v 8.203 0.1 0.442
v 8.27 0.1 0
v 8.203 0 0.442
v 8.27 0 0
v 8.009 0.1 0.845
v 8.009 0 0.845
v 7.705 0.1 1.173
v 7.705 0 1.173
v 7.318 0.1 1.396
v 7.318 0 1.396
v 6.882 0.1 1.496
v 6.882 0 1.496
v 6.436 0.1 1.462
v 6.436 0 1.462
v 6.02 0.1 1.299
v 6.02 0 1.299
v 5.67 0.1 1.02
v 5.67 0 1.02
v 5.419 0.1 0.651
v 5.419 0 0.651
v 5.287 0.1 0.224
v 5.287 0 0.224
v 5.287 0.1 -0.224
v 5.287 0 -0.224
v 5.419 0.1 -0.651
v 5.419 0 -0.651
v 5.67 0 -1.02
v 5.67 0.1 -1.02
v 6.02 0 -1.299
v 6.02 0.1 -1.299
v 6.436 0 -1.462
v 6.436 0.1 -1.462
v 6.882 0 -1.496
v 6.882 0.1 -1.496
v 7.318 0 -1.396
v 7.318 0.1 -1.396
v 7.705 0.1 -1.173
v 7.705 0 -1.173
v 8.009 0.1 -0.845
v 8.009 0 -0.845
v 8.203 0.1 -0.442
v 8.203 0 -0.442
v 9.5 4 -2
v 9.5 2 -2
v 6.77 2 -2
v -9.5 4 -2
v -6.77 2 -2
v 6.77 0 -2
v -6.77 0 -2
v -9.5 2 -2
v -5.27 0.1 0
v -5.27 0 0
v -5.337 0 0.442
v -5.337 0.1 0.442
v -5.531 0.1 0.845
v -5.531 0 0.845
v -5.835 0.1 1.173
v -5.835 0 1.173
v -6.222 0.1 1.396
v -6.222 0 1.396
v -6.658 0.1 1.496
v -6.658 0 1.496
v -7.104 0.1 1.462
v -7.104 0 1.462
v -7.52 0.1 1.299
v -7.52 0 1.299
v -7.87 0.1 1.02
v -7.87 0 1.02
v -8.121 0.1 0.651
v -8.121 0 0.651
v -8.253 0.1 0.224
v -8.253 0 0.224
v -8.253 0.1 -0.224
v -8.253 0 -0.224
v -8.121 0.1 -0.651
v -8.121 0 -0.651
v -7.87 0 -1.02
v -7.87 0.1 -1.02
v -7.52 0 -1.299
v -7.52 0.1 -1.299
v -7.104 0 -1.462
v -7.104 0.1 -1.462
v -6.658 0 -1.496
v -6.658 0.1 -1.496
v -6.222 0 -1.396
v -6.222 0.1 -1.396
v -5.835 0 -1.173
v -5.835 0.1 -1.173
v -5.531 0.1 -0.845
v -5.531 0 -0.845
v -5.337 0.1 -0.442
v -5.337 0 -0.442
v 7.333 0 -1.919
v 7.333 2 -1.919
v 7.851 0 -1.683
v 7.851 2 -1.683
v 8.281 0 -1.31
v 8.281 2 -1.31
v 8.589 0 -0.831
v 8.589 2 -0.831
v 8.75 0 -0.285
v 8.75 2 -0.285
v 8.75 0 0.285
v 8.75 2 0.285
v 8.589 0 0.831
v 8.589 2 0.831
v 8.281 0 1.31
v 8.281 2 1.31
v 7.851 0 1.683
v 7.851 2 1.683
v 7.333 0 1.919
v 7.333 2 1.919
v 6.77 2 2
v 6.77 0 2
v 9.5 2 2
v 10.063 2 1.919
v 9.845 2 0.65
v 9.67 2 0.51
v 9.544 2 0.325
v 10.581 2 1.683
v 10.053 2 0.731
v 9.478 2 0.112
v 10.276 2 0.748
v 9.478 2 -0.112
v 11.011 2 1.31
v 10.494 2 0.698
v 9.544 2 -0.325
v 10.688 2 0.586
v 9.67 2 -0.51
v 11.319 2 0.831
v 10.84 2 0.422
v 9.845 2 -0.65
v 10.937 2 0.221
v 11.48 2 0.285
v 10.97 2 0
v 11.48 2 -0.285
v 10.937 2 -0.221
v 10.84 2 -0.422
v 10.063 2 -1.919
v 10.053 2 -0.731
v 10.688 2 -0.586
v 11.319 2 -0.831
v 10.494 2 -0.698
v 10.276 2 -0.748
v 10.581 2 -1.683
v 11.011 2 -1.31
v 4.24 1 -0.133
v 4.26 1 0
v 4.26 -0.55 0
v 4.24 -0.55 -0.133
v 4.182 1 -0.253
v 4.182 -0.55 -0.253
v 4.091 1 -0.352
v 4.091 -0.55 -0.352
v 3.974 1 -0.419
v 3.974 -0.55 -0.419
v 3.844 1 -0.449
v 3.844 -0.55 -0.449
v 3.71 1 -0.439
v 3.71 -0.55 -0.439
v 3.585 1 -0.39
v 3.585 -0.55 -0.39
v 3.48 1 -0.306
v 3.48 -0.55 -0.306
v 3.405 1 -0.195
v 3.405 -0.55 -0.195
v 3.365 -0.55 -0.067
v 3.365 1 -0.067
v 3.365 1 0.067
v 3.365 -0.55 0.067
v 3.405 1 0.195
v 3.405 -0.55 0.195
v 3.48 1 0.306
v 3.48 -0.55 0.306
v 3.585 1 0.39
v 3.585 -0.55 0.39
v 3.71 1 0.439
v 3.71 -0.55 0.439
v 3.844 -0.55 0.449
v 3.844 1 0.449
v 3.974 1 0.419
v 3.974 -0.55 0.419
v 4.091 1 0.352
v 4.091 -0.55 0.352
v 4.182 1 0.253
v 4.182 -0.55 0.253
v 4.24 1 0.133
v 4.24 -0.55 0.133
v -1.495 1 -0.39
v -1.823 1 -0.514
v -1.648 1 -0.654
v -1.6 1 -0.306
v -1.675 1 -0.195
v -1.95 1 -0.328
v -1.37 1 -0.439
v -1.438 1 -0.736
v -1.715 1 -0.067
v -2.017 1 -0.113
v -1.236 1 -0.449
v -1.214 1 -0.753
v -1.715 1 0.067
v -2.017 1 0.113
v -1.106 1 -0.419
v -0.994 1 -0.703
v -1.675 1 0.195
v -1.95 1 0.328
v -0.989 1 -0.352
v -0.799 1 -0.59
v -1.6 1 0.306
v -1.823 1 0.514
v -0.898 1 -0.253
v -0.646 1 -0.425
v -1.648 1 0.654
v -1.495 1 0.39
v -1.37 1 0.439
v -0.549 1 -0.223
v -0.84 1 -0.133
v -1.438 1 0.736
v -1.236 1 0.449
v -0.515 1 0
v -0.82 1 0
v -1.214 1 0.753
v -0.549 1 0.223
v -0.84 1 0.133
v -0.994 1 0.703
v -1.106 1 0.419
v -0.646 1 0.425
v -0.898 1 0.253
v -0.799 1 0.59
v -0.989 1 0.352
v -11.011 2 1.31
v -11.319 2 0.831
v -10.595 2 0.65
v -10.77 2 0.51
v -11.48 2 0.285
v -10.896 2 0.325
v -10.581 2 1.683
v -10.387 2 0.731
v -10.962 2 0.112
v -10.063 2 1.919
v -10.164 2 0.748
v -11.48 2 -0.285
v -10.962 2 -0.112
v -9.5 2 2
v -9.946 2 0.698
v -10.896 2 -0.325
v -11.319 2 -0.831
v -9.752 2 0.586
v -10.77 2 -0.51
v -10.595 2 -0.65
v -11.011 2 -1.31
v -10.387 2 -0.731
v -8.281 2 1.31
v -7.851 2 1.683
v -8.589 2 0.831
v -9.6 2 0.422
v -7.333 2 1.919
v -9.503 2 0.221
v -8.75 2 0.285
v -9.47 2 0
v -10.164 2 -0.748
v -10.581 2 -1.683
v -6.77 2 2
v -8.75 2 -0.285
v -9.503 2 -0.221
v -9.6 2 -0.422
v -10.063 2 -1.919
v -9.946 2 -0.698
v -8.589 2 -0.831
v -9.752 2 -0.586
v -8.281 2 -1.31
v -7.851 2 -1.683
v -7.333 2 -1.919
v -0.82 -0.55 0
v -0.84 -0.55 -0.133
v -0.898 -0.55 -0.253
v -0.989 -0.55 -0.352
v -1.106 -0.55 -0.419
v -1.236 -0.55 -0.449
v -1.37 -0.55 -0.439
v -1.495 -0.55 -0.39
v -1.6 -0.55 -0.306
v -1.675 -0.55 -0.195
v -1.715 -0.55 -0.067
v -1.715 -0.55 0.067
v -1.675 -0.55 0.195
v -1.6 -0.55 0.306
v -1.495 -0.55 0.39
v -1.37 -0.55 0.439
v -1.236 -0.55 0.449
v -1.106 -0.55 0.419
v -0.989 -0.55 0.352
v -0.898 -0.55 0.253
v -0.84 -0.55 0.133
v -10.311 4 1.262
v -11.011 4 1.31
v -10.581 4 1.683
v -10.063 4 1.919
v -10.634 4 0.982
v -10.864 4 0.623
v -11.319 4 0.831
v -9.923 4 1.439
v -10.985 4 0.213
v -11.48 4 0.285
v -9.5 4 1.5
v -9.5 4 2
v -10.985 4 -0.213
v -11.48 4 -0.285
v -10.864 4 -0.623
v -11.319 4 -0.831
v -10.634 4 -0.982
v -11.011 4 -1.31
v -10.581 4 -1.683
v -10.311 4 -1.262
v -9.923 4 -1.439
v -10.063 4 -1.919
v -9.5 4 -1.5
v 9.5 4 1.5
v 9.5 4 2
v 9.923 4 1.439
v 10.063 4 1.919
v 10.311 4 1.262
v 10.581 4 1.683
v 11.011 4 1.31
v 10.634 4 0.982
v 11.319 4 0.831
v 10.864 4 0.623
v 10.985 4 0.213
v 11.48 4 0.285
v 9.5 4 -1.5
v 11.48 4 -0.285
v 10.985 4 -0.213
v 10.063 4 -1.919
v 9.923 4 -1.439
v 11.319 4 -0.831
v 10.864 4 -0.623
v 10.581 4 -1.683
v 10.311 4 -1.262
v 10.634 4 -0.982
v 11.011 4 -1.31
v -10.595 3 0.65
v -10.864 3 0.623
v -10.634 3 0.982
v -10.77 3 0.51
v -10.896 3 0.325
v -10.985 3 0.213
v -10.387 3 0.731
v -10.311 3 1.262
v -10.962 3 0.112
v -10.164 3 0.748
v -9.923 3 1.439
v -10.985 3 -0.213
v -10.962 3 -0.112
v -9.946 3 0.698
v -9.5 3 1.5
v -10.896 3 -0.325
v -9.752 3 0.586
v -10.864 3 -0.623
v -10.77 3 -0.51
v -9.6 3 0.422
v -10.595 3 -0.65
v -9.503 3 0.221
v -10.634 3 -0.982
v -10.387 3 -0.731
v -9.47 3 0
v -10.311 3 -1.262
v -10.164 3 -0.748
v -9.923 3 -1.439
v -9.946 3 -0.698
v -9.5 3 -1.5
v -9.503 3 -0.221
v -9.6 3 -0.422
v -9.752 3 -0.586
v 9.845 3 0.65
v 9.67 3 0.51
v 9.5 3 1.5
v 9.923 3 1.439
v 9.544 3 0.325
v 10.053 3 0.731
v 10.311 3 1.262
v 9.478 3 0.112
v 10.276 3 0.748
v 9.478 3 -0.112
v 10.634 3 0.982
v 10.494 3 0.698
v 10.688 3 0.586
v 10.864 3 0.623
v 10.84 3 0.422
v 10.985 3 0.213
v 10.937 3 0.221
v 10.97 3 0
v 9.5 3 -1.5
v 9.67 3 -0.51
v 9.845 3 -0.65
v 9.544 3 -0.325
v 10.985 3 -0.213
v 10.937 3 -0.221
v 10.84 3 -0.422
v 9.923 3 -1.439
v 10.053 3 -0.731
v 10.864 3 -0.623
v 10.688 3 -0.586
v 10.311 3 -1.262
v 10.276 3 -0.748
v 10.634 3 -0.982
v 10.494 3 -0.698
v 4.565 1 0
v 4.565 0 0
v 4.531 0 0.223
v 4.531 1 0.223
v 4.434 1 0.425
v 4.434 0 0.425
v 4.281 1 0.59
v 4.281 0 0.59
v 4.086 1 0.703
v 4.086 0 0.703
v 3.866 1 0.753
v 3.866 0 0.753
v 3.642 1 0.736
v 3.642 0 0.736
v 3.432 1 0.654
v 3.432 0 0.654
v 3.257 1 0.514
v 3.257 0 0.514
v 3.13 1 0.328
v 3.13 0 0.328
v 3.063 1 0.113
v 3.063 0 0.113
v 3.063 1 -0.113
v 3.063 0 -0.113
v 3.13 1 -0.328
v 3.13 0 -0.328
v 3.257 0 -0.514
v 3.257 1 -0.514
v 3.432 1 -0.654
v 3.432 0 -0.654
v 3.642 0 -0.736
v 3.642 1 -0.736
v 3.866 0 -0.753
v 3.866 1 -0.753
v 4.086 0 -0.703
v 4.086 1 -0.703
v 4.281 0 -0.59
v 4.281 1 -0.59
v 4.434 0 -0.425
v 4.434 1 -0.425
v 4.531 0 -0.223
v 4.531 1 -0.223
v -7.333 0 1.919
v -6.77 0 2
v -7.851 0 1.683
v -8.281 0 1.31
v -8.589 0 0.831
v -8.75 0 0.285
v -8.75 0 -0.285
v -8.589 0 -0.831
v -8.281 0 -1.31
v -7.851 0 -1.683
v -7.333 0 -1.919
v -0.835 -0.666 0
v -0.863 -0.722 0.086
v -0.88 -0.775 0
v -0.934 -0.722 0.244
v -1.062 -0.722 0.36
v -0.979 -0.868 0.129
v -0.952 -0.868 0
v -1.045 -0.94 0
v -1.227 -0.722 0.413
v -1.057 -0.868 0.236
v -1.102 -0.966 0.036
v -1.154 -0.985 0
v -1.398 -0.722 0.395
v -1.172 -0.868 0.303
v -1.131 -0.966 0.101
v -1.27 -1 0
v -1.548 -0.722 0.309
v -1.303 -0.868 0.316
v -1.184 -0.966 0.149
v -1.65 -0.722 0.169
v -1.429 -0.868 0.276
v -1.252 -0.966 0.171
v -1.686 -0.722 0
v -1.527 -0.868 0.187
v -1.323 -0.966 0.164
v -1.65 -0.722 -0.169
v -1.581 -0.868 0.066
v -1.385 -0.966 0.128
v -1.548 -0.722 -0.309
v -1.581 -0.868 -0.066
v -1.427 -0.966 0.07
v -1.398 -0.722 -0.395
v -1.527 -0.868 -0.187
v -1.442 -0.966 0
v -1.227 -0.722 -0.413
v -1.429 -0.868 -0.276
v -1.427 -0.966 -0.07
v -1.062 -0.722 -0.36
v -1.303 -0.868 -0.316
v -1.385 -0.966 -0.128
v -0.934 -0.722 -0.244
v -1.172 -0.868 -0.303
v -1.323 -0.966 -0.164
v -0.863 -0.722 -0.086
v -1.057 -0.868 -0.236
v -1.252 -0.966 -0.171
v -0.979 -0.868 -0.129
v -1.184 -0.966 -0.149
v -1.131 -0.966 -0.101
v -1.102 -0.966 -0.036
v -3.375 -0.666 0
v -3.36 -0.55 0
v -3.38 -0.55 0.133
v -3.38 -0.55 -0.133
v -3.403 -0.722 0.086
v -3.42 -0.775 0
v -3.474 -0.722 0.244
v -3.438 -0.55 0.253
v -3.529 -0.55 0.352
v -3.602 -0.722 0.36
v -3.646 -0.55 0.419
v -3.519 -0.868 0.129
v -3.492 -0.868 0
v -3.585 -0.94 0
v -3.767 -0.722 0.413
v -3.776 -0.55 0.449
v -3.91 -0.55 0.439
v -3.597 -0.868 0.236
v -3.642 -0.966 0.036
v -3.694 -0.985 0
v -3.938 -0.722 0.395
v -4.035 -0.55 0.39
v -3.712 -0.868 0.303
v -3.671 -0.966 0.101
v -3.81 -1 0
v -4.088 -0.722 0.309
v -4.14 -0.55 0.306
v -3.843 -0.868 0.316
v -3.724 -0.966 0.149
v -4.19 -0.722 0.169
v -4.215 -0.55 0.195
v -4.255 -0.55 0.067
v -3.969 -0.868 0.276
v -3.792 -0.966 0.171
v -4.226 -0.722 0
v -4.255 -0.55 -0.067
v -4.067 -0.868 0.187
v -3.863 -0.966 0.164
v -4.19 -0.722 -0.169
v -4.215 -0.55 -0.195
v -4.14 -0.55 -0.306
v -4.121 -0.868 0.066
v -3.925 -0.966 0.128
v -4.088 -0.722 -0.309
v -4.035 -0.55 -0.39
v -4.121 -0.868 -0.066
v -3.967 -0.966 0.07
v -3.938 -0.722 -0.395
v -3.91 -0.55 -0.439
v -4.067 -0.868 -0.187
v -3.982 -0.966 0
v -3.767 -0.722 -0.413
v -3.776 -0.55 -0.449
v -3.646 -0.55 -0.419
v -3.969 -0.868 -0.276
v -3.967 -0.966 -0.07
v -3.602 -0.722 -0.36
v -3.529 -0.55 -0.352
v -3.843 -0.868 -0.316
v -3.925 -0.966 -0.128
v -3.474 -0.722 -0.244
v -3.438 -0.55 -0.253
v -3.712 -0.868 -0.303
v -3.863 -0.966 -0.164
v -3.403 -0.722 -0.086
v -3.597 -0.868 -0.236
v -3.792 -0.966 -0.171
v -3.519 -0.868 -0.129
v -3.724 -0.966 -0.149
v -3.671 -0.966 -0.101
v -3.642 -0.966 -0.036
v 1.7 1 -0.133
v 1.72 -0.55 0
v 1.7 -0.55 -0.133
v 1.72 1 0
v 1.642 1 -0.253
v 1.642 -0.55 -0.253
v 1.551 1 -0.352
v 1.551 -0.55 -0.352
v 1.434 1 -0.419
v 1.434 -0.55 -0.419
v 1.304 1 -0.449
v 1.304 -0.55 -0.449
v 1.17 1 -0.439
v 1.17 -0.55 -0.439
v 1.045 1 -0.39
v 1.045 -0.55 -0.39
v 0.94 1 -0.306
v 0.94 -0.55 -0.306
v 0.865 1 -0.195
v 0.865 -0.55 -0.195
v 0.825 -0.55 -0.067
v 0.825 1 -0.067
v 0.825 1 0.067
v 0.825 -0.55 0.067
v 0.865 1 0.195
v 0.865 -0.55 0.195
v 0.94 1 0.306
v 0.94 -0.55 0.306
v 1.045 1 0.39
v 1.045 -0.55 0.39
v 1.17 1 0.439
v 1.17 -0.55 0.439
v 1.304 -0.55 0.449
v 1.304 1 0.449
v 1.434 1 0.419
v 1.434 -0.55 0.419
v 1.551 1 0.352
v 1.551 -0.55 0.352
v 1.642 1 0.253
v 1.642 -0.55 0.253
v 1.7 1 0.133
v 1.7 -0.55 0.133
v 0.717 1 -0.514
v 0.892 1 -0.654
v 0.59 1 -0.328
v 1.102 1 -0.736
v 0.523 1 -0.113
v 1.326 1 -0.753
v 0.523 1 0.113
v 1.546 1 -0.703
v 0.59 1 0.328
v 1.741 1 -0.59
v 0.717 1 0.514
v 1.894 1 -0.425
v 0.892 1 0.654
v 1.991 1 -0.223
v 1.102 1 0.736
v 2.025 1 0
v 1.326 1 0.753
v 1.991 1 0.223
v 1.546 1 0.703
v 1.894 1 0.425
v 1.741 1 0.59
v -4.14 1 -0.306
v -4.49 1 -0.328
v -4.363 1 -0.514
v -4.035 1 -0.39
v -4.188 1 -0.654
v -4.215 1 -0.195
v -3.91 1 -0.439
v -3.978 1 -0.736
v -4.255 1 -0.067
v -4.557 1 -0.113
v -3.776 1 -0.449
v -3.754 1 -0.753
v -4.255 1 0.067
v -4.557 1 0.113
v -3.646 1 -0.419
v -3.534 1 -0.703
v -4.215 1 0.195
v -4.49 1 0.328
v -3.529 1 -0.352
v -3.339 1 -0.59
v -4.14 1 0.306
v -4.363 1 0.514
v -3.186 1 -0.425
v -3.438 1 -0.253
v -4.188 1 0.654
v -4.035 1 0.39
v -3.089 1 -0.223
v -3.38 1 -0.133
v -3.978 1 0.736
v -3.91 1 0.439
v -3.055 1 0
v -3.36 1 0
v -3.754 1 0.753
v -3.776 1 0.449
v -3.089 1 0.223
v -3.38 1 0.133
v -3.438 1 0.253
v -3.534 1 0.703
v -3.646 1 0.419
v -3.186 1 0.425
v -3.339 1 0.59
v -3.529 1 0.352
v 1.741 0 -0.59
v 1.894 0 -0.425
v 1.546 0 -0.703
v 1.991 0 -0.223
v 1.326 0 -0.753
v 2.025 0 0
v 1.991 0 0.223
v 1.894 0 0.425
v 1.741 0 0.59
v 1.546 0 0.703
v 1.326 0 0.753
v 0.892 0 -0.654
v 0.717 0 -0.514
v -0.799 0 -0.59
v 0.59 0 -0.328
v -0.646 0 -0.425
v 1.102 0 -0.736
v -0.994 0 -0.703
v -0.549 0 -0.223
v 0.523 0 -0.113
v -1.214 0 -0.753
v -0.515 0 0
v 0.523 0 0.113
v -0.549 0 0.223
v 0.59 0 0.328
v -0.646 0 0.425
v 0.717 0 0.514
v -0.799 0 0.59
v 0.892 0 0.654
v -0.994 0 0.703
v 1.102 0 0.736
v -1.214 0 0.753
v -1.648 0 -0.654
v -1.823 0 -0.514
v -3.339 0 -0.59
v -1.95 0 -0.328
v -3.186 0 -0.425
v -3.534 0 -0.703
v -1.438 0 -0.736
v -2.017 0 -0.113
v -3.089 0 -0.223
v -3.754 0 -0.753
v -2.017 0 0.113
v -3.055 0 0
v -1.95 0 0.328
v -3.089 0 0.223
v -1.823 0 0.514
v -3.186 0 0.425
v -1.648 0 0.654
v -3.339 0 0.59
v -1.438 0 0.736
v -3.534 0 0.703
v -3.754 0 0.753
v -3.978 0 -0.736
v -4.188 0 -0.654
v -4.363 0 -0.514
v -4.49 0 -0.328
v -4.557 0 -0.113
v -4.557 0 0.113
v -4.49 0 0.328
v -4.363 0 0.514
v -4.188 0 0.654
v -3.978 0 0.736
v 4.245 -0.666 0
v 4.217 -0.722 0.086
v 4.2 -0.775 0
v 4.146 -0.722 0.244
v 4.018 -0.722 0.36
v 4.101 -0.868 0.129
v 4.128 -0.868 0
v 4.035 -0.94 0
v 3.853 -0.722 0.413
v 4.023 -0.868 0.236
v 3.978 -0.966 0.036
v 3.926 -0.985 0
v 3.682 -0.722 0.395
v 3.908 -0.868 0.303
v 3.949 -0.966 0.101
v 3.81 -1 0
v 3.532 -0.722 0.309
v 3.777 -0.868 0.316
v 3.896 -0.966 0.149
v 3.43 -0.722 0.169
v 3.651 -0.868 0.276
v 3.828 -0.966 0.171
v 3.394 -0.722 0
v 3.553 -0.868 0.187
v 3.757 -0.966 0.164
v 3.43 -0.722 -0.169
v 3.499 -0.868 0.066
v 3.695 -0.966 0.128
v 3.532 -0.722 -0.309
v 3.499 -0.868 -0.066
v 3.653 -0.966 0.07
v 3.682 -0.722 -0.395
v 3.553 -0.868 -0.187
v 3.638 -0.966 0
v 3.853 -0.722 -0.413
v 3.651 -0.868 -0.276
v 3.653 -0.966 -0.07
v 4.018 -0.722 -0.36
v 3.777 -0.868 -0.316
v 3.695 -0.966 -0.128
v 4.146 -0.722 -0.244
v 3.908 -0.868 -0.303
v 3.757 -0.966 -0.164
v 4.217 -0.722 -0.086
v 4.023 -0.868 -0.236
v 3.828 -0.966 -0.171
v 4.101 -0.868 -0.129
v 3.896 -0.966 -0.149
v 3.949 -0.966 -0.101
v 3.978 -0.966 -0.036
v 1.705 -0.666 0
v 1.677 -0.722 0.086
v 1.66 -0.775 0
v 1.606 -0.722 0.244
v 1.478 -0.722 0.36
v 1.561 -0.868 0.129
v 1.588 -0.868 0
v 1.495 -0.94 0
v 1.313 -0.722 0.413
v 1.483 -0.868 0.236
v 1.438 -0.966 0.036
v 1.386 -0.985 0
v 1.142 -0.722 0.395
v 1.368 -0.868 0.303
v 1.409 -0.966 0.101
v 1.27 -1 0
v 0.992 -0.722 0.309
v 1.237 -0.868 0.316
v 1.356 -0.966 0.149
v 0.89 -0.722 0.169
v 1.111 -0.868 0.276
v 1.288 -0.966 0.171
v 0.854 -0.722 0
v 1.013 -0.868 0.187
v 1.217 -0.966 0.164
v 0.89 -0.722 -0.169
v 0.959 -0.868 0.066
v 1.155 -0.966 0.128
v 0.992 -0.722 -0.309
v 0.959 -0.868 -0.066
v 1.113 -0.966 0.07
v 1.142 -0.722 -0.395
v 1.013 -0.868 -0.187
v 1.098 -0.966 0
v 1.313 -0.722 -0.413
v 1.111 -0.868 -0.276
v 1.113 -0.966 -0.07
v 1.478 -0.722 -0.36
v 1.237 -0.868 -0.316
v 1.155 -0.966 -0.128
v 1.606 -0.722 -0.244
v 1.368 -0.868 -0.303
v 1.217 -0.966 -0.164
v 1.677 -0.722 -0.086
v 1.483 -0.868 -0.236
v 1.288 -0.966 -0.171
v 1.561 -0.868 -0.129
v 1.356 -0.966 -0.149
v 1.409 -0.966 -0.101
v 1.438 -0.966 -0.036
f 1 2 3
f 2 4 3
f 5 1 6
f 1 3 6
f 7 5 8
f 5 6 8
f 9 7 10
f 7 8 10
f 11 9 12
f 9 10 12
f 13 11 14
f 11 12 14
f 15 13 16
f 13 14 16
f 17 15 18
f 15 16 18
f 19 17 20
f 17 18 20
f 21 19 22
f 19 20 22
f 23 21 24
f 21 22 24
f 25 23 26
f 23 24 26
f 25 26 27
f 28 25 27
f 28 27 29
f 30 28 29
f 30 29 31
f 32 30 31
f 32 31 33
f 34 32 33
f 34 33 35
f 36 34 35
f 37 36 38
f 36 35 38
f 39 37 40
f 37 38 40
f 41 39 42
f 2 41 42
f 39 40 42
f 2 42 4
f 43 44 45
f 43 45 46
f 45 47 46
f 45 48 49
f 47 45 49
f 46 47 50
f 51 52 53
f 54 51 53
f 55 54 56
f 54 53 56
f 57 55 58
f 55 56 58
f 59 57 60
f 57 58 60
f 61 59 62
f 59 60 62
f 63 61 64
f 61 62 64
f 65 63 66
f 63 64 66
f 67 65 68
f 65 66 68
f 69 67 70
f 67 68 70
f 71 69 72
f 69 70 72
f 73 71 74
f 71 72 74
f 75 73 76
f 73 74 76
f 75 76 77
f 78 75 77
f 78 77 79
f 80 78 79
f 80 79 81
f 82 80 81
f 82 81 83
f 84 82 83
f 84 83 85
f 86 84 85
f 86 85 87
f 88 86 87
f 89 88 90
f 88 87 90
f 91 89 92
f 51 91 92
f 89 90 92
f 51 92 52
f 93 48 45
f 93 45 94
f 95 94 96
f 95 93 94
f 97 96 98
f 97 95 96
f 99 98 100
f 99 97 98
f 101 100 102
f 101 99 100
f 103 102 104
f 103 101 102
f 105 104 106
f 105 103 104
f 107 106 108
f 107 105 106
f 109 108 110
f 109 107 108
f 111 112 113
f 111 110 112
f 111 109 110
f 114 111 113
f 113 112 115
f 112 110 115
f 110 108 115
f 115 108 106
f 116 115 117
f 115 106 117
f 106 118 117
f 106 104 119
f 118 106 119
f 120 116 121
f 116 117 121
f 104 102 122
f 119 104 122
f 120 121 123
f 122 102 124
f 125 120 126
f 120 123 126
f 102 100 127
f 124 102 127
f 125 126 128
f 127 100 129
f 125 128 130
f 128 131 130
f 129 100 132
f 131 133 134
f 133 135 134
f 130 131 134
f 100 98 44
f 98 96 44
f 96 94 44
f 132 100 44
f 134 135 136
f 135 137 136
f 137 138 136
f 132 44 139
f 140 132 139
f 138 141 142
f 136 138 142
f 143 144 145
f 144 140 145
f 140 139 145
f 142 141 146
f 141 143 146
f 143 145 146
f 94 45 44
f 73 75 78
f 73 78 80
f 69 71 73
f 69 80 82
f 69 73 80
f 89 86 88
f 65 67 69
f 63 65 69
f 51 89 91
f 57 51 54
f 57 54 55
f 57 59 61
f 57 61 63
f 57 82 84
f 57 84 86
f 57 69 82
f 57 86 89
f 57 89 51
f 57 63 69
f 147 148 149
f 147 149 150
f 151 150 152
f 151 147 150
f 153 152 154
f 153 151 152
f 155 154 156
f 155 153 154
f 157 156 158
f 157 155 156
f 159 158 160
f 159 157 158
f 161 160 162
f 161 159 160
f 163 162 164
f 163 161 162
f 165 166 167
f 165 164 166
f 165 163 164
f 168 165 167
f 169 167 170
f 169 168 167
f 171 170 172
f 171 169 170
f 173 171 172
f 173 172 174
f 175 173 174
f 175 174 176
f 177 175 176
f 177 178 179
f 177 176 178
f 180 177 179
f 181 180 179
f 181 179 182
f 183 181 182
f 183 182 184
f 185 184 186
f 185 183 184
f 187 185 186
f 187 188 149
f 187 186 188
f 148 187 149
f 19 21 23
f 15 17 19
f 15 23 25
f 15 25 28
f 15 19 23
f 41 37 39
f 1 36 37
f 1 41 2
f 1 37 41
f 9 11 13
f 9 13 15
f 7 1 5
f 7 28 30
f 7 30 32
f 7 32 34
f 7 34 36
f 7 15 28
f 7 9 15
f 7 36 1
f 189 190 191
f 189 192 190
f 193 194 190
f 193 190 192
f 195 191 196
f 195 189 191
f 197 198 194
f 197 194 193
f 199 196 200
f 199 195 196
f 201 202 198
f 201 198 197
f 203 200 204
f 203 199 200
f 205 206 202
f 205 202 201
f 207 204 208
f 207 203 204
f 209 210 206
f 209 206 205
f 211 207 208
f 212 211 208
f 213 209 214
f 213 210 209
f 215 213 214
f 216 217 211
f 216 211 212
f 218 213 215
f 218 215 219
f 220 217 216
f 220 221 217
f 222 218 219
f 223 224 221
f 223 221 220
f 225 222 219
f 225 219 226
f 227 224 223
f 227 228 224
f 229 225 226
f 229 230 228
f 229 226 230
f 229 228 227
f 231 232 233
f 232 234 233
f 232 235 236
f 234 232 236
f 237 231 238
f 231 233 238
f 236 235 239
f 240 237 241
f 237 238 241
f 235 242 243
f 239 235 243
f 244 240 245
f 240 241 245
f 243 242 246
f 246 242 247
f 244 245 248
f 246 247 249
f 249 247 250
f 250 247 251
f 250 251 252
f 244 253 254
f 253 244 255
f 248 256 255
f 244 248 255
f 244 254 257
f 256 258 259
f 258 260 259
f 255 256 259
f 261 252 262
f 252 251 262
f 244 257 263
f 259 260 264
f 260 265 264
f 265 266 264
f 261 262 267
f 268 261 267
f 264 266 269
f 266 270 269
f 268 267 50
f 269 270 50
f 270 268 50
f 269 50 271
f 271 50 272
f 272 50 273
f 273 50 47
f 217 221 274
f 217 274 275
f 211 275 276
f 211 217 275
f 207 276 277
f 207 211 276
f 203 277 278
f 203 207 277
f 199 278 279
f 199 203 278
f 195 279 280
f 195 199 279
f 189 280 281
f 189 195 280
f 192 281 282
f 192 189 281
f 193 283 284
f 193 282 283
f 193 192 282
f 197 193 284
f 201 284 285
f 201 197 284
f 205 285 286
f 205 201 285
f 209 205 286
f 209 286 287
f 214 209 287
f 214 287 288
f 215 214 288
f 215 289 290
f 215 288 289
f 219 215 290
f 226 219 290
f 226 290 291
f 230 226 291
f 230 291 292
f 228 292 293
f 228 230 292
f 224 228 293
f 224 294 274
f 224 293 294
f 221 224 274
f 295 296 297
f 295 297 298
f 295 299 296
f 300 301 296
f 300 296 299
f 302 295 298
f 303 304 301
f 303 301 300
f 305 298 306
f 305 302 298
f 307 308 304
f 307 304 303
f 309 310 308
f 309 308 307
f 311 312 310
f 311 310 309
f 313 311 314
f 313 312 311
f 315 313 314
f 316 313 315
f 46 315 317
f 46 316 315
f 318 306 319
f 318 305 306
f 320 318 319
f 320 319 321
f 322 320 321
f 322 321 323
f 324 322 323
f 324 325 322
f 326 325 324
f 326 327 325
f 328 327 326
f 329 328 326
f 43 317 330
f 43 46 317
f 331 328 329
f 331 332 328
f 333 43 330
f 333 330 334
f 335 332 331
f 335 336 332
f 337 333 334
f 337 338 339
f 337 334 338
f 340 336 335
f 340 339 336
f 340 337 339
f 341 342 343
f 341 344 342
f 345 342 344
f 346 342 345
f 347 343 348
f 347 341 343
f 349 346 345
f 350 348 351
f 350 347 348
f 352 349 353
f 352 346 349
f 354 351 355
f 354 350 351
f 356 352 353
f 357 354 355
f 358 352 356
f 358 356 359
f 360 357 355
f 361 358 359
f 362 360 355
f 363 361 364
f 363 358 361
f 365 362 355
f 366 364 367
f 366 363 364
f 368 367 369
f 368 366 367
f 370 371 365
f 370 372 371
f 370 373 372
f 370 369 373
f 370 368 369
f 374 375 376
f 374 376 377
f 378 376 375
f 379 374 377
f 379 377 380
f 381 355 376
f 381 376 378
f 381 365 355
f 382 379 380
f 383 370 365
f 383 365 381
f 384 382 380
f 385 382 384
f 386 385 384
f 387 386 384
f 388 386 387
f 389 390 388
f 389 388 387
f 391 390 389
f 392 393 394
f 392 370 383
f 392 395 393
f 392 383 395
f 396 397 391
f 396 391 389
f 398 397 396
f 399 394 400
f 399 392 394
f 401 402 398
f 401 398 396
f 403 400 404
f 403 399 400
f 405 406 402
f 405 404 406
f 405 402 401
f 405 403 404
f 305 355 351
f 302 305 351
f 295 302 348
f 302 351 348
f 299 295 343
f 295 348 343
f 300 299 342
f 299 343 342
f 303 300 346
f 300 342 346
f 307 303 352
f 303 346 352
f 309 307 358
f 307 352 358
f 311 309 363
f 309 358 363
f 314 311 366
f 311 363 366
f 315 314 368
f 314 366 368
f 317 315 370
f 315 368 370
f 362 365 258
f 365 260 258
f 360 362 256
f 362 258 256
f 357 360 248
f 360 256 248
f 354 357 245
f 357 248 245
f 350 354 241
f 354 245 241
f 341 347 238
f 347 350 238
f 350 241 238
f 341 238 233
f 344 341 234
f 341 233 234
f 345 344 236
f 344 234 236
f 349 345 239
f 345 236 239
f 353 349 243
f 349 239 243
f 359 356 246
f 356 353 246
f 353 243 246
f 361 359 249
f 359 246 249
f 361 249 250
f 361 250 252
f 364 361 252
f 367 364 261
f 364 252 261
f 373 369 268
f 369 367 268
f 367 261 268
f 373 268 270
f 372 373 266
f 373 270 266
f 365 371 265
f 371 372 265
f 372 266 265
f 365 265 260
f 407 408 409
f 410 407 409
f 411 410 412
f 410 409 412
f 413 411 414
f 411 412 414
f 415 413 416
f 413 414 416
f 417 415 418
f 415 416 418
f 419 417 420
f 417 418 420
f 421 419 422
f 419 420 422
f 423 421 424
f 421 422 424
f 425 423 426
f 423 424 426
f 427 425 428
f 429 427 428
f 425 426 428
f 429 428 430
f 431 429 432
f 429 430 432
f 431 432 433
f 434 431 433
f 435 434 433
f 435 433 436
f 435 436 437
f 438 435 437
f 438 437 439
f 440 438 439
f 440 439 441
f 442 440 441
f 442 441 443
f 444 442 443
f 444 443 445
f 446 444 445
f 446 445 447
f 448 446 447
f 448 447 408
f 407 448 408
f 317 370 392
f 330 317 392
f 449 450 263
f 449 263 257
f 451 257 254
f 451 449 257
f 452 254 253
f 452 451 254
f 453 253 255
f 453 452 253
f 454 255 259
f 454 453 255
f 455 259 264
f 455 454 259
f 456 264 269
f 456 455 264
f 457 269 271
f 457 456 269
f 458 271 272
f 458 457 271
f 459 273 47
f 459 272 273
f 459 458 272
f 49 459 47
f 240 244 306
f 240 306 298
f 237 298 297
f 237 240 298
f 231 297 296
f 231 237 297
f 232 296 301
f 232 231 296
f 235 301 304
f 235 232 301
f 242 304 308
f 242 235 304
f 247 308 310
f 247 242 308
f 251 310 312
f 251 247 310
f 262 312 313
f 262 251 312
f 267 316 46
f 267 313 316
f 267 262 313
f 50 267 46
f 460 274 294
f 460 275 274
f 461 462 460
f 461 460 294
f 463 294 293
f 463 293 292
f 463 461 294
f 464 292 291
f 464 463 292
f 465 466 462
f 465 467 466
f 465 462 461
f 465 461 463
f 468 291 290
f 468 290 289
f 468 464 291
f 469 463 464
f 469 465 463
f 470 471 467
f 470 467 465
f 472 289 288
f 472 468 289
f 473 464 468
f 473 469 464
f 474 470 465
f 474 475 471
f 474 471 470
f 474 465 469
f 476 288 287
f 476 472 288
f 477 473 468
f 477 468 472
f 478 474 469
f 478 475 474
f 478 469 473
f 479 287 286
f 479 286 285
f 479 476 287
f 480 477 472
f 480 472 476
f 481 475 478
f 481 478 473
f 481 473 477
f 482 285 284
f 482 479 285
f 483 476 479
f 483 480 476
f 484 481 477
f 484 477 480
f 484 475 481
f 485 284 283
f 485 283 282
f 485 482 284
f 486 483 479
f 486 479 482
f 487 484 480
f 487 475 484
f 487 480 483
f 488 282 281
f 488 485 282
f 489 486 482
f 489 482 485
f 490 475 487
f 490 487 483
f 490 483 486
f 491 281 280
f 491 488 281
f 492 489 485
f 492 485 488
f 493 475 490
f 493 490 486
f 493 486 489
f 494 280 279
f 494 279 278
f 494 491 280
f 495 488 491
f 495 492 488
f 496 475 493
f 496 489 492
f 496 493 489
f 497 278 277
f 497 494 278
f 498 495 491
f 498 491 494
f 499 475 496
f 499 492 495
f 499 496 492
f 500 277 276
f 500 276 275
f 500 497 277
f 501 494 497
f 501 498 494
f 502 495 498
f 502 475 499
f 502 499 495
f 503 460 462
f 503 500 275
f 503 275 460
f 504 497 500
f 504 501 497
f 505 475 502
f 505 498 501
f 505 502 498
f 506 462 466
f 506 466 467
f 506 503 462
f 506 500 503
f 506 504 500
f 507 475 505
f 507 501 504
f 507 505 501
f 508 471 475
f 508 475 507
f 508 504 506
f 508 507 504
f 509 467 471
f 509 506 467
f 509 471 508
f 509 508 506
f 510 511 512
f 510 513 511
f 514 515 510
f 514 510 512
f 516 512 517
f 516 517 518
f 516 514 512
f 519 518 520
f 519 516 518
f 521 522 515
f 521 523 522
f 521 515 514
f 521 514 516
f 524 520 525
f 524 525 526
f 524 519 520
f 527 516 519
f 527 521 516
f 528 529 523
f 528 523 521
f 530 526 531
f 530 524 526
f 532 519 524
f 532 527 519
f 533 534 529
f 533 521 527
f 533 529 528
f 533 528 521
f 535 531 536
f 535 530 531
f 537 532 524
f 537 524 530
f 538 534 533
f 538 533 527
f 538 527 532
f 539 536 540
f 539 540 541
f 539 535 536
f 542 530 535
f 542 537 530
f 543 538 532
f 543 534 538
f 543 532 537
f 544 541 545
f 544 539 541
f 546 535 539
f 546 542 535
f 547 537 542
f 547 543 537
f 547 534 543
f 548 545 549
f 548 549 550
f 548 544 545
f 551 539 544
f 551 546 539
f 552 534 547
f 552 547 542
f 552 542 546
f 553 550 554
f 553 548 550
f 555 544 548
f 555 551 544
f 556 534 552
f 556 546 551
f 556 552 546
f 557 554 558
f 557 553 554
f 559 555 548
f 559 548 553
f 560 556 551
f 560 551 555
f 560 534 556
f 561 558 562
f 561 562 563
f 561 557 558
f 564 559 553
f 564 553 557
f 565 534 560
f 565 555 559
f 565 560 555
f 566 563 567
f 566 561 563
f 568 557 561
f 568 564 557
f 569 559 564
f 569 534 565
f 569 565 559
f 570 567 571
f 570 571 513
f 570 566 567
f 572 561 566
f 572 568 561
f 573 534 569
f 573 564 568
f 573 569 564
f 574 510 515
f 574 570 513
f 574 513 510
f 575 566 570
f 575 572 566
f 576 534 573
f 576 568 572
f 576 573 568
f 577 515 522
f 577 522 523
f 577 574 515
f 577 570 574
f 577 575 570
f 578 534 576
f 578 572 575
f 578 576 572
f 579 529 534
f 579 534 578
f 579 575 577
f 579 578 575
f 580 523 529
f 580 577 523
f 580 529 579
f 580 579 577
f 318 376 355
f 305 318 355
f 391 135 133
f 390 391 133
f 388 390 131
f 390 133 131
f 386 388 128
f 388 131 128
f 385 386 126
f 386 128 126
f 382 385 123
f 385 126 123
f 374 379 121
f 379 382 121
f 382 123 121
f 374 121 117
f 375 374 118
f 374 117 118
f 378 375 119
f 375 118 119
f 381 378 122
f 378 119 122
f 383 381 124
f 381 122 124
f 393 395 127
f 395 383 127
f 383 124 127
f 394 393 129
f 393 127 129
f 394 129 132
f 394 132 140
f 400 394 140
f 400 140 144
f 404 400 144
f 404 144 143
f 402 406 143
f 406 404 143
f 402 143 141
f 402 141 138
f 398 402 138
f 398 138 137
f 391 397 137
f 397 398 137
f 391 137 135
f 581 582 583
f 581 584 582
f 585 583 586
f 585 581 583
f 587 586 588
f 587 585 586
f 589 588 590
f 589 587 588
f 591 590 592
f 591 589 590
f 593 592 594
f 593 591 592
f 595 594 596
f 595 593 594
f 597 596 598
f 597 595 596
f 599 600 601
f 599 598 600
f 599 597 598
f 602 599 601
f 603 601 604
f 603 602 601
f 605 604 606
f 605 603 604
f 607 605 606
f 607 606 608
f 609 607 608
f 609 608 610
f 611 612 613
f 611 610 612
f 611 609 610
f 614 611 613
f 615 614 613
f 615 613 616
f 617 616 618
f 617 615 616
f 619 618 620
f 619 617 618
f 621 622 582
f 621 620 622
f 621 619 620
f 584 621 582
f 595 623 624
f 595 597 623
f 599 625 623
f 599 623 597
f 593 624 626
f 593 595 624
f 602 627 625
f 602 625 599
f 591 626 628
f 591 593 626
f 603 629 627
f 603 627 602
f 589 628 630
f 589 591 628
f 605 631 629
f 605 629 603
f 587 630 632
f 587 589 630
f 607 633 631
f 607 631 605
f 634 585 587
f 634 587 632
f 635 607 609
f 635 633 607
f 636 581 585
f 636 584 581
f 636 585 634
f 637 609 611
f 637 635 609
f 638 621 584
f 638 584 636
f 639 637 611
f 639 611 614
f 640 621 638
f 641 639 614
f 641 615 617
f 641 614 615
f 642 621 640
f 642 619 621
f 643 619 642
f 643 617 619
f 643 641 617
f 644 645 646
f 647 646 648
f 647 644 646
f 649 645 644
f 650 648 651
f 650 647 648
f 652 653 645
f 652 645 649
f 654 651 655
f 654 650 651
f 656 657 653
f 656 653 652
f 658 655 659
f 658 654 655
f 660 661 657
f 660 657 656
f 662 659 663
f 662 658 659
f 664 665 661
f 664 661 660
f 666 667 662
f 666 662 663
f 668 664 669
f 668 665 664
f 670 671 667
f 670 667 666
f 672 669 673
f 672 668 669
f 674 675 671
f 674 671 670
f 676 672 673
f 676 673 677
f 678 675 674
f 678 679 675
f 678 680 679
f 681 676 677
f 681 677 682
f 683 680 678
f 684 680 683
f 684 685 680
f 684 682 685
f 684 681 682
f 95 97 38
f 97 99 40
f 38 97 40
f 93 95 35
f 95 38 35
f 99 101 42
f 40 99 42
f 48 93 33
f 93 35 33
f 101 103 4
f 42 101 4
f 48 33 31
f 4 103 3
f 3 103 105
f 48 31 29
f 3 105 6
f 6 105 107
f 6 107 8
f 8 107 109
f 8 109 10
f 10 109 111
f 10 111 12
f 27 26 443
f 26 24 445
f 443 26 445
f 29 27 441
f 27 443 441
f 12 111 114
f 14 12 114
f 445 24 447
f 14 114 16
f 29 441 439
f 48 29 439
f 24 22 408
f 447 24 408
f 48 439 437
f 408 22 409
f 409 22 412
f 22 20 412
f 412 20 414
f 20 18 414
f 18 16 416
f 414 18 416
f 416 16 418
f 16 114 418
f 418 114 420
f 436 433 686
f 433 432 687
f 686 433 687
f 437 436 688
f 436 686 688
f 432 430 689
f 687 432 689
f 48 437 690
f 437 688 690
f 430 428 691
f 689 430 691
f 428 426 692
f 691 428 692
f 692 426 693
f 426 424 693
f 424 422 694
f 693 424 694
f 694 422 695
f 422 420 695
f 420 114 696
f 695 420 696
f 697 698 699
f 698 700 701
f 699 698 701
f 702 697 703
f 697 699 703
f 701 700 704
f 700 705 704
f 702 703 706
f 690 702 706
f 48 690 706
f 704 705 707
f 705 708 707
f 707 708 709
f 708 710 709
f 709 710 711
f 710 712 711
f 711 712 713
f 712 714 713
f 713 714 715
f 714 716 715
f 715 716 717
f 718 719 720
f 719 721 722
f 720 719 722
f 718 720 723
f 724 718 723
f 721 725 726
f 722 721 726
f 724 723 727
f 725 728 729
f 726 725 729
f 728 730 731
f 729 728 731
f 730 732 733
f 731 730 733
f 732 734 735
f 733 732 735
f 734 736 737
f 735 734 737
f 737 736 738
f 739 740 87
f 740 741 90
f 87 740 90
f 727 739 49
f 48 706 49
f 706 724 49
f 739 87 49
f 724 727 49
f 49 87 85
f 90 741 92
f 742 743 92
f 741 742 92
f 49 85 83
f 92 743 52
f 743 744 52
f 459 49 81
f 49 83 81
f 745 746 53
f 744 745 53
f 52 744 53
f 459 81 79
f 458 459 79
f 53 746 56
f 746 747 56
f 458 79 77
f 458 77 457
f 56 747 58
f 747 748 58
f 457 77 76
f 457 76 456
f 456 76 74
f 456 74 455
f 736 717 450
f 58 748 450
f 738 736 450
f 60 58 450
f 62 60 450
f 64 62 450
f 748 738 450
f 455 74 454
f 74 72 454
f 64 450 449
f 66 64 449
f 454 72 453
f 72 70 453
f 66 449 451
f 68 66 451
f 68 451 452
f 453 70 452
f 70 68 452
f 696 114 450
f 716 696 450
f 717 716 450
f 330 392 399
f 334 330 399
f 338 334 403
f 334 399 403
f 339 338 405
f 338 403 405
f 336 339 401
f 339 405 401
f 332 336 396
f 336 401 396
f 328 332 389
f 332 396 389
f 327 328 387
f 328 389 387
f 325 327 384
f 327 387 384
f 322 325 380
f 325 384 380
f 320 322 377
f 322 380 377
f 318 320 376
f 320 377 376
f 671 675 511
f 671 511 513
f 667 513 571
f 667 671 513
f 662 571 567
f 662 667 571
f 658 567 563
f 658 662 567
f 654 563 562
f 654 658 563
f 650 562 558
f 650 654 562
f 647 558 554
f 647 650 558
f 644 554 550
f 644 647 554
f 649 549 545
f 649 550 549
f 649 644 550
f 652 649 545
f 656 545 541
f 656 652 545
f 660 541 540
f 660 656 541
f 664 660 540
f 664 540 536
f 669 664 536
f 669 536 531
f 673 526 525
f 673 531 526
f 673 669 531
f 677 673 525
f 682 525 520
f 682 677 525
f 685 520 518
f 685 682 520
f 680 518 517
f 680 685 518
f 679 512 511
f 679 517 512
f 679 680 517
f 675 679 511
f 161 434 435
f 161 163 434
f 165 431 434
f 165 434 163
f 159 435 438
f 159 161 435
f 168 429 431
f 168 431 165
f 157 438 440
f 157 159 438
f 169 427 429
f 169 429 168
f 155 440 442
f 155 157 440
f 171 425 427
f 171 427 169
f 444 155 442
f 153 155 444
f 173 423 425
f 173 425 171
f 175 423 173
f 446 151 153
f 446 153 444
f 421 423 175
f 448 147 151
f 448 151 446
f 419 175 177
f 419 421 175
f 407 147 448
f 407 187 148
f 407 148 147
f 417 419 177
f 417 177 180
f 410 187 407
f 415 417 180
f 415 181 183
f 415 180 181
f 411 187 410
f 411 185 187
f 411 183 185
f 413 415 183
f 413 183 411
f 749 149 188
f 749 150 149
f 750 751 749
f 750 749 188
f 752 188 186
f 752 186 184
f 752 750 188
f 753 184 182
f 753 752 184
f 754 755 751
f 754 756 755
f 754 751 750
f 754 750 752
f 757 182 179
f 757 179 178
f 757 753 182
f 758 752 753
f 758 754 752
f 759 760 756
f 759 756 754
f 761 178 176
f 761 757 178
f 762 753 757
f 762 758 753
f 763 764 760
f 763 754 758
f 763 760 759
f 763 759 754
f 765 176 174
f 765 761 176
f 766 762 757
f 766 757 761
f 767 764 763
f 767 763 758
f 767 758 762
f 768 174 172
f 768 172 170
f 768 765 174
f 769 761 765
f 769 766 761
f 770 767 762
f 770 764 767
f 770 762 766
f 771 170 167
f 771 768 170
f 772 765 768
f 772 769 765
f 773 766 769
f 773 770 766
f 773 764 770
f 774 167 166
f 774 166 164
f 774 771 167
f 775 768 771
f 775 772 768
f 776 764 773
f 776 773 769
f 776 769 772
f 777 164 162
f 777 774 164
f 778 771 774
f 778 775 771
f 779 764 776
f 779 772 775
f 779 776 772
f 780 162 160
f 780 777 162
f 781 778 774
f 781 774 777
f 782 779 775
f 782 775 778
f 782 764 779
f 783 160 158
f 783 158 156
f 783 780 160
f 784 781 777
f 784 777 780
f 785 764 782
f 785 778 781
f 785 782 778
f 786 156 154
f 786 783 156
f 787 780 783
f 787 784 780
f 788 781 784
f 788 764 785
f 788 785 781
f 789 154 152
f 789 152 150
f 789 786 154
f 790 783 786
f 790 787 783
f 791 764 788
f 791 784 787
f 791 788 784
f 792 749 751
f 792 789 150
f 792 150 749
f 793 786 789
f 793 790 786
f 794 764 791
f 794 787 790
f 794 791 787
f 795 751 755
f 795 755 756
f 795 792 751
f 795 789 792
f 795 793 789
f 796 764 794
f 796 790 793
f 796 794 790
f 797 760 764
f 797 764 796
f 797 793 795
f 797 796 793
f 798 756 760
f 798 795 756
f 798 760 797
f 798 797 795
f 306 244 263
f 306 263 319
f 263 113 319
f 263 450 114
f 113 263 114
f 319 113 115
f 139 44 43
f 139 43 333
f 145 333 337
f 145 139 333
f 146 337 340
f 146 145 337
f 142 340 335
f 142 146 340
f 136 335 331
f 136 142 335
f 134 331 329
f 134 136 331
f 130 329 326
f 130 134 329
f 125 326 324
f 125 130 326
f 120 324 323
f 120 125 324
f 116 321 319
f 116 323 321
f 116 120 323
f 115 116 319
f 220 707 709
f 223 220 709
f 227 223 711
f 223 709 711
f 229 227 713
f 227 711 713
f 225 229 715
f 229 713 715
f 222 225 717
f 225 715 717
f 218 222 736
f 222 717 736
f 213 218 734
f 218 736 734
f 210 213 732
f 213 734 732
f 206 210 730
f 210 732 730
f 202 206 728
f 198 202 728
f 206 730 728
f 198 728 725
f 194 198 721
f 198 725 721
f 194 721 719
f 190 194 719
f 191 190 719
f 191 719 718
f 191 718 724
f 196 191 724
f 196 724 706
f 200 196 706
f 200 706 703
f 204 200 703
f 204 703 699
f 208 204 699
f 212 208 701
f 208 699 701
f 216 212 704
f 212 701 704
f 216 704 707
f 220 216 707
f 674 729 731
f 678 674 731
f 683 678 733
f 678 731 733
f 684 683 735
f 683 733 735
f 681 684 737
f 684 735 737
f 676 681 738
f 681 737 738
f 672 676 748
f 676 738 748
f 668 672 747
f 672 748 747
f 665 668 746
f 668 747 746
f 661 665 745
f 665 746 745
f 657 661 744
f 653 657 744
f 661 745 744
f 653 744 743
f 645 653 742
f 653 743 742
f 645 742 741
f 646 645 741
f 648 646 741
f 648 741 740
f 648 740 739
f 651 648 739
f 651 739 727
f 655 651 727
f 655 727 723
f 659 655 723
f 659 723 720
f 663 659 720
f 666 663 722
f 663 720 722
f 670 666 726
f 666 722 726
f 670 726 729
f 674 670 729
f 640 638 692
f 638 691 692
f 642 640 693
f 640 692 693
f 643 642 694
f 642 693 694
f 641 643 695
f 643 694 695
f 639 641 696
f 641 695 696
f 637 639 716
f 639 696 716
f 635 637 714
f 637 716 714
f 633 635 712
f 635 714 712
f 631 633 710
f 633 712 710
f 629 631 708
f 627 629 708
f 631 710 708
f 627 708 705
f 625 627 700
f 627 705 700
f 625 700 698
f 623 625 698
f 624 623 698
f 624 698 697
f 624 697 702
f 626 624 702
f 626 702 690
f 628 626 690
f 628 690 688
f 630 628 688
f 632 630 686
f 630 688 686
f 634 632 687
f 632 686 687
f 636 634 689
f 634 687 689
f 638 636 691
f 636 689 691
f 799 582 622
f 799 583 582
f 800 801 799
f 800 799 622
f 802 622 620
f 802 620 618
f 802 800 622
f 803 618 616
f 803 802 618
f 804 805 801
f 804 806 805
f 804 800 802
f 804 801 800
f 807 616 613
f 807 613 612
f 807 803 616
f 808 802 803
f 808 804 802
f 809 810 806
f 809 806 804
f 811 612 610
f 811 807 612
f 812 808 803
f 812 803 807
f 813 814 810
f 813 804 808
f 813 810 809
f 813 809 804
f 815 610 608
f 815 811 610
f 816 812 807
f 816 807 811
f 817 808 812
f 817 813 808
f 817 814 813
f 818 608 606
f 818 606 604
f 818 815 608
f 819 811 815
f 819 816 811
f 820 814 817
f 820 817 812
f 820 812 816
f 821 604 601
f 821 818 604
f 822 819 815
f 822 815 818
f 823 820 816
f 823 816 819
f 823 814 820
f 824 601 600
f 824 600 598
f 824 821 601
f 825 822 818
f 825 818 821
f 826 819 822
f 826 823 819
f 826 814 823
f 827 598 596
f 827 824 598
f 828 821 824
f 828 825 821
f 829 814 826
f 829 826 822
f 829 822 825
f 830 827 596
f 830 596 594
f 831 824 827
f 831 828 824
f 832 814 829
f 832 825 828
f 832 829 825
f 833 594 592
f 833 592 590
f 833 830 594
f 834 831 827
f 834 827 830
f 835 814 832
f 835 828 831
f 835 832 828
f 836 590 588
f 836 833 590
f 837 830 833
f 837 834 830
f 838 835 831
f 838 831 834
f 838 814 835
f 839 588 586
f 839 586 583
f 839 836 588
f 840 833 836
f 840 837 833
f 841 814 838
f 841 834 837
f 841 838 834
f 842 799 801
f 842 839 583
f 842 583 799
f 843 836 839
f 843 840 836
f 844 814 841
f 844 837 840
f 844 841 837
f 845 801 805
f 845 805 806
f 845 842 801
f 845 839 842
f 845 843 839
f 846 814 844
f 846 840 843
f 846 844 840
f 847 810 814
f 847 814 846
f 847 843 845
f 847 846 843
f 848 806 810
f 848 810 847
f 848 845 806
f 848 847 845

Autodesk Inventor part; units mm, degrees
ref_plane "YZ Plane" through (0, 0, 0) normal (1, 0, 0) x (0, 1, 0)
ref_plane "XZ Plane" through (0, 0, 0) normal (0, 1, 0) x (-1, 0, 0)
ref_plane "XY Plane" through (0, 0, 0) normal (0, 0, 1) x (1, 0, 0)
sketch "Sketch1" plane through (0, 0, 0) normal (0, 1, 0) x (-1, 0, 0)
  line L0 (-16.7648, -6.8244) -> (19.5108, -6.8244) construction
  line L1 (19.5108, -6.8244) -> (19.5108, -28.8158) construction
  line L2 (19.5108, -28.8158) -> (-16.7648, -28.8158) construction
  line L3 (-16.7648, -28.8158) -> (-16.7648, -6.8244) construction
  line L4 (6.77, 0) -> (-6.77, 0) construction
  line L5 (6.77, 2) -> (-6.77, 2)
  line L6 (-6.77, -2) -> (6.77, -2)
  arc A0 (6.77, -2) -> (6.77, 2) centre (6.77, 0) ccw
  arc A1 (-6.77, 2) -> (-6.77, -2) centre (-6.77, 0) ccw
  point P0 (0, 0)
  point P1 (-8.77, 0)
  point P2 (8.77, 0)
  dimension "d11" = 17.54
  dimension "d18" = 4
extrude "Extrusion1" add sketch "Sketch1" along normal blind 2
sketch "Sketch2" plane through (0, 2, 0) normal (0, 1, 0) x (1, 0, 0)
  arc A0 (6.77, -2) -> (6.77, 2) centre (6.77, 0) ccw projected
  line L0 (6.77, 2) -> (-6.77, 2) projected
  arc A1 (-6.77, 2) -> (-6.77, -2) centre (-6.77, 0) ccw projected
  line L1 (-6.77, -2) -> (6.77, -2) projected
  line L2 (-9.5, 0) -> (9.5, 0) construction
  line L3 (-9.5, -2) -> (9.5, -2)
  line L4 (9.5, 2) -> (-9.5, 2)
  arc A2 (-9.5, 2) -> (-9.5, -2) centre (-9.5, 0) ccw
  arc A3 (9.5, -2) -> (9.5, 2) centre (9.5, 0) ccw
  circle A4 centre (-10.22, 0) radius 0.75
  line L5 (0, -2) -> (0, 2)
  circle A5 centre (10.22, 0) radius 0.75
  point P0 (0, 0)
  point P1 (11.5, 0)
  point P2 (-11.5, 0)
  point P3 (0, 0)
  point P4 (-6.77, -2)
  point P5 (6.77, -2)
  dimension "d23" = 4
  dimension "d24" = 23
  dimension "d25" = 1.5
  dimension "d26" = 20.44
extrude "Extrusion2" add sketch "Sketch2" along normal blind 1
sketch "Sketch3" plane through (0, 3, 0) normal (0, 1, 0) x (1, 0, 0)
  line L0 (9.5, 2) -> (-9.5, 2) projected
  arc A0 (-9.5, 2) -> (-9.5, -2) centre (-9.5, 0) ccw projected
  line L1 (-9.5, -2) -> (9.5, -2) projected
  arc A1 (9.5, -2) -> (9.5, 2) centre (9.5, 0) ccw projected
  circle A2 centre (-10.22, 0) radius 0.75 projected
  circle A3 centre (10.22, 0) radius 0.75 projected
  line L2 (-9.5, 1.5) -> (9.5, 1.5)
  arc A4 (9.5, -1.5) -> (9.5, 1.5) centre (9.5, 0) ccw
  line L3 (9.5, -1.5) -> (-9.5, -1.5)
  arc A5 (-9.5, 1.5) -> (-9.5, -1.5) centre (-9.5, 0) ccw
  point P0 (0, 0)
  dimension "d29" = 0.5
extrude "Extrusion3" add sketch "Sketch3" along normal blind 1 contours A1 L1 A0 L0
sketch "Sketch4" plane through (0, 0, 0) normal (0, -1, 0) x (1, 0, 0)
  circle A0 centre (-3.81, 0) radius 0.755
  circle A1 centre (-1.27, 0) radius 0.755
  line L0 (-6.77, 2) -> (6.77, 2) projected
  line L1 (0, 2) -> (0, -2)
  line L2 (6.77, -2) -> (-6.77, -2) projected
  circle A2 centre (3.81, 0) radius 0.755
  circle A3 centre (1.27, 0) radius 0.755
  point P0 (0, 0)
  dimension "d32" = 2.54
  dimension "d33" = 7.62
  dimension "d34" = 1.51
extrude "Extrusion4" cut sketch "Sketch4" against normal blind 1
sketch "Sketch5" plane through (-3.81, 1, 0) normal (0, -1, 0) x (1, 0, 0)
  circle A0 centre (0, 0) radius 0.755 projected
  circle A1 centre (2.54, 0) radius 0.755 projected
  circle A2 centre (5.08, 0) radius 0.755 projected
  circle A3 centre (7.62, 0) radius 0.755 projected
  circle A4 centre (0, 0) radius 0.755 projected
  circle A5 centre (0, 0) radius 0.45
  circle A6 centre (2.54, 0) radius 0.45
  circle A7 centre (5.08, 0) radius 0.45
  circle A8 centre (7.62, 0) radius 0.45
  point P0 (3.81, 0)
  dimension "d37" = 0.9
extrude "Extrusion5" add sketch "Sketch5" along normal blind 2 contours A5 | A6 | A7 | A8
fillet "Fillet1" radius 0.45 4 edges at (-4.26, -1, 0) (-1.72, -1, 0) (0.82, -1, 0) (3.36, -1, 0)
sketch "Sketch6" plane through (0, 0, 0) normal (0, -1, 0) x (1, 0, 0)
  circle A0 centre (1.27, 0) radius 0.755 projected
  circle A1 centre (-1.27, 0) radius 0.755 projected
  circle A2 centre (3.81, 0) radius 0.755 projected
  circle A3 centre (-3.81, 0) radius 0.755 projected
  arc A4 (6.77, -2) -> (6.77, 2) centre (6.77, 0) ccw projected
  line L0 (-6.77, 2) -> (6.77, 2) projected
  arc A5 (-6.77, 2) -> (-6.77, -2) centre (-6.77, 0) ccw projected
  line L1 (6.77, -2) -> (-6.77, -2) projected
  circle A6 centre (-6.77, 0) radius 1.5
  circle A7 centre (6.77, 0) radius 1.5
  point P0 (0, 0)
  dimension "d41" = 3
extrude "Extrusion6" cut sketch "Sketch6" against normal blind 0.1 contours A6 | A7
properties part number "Connector1"
